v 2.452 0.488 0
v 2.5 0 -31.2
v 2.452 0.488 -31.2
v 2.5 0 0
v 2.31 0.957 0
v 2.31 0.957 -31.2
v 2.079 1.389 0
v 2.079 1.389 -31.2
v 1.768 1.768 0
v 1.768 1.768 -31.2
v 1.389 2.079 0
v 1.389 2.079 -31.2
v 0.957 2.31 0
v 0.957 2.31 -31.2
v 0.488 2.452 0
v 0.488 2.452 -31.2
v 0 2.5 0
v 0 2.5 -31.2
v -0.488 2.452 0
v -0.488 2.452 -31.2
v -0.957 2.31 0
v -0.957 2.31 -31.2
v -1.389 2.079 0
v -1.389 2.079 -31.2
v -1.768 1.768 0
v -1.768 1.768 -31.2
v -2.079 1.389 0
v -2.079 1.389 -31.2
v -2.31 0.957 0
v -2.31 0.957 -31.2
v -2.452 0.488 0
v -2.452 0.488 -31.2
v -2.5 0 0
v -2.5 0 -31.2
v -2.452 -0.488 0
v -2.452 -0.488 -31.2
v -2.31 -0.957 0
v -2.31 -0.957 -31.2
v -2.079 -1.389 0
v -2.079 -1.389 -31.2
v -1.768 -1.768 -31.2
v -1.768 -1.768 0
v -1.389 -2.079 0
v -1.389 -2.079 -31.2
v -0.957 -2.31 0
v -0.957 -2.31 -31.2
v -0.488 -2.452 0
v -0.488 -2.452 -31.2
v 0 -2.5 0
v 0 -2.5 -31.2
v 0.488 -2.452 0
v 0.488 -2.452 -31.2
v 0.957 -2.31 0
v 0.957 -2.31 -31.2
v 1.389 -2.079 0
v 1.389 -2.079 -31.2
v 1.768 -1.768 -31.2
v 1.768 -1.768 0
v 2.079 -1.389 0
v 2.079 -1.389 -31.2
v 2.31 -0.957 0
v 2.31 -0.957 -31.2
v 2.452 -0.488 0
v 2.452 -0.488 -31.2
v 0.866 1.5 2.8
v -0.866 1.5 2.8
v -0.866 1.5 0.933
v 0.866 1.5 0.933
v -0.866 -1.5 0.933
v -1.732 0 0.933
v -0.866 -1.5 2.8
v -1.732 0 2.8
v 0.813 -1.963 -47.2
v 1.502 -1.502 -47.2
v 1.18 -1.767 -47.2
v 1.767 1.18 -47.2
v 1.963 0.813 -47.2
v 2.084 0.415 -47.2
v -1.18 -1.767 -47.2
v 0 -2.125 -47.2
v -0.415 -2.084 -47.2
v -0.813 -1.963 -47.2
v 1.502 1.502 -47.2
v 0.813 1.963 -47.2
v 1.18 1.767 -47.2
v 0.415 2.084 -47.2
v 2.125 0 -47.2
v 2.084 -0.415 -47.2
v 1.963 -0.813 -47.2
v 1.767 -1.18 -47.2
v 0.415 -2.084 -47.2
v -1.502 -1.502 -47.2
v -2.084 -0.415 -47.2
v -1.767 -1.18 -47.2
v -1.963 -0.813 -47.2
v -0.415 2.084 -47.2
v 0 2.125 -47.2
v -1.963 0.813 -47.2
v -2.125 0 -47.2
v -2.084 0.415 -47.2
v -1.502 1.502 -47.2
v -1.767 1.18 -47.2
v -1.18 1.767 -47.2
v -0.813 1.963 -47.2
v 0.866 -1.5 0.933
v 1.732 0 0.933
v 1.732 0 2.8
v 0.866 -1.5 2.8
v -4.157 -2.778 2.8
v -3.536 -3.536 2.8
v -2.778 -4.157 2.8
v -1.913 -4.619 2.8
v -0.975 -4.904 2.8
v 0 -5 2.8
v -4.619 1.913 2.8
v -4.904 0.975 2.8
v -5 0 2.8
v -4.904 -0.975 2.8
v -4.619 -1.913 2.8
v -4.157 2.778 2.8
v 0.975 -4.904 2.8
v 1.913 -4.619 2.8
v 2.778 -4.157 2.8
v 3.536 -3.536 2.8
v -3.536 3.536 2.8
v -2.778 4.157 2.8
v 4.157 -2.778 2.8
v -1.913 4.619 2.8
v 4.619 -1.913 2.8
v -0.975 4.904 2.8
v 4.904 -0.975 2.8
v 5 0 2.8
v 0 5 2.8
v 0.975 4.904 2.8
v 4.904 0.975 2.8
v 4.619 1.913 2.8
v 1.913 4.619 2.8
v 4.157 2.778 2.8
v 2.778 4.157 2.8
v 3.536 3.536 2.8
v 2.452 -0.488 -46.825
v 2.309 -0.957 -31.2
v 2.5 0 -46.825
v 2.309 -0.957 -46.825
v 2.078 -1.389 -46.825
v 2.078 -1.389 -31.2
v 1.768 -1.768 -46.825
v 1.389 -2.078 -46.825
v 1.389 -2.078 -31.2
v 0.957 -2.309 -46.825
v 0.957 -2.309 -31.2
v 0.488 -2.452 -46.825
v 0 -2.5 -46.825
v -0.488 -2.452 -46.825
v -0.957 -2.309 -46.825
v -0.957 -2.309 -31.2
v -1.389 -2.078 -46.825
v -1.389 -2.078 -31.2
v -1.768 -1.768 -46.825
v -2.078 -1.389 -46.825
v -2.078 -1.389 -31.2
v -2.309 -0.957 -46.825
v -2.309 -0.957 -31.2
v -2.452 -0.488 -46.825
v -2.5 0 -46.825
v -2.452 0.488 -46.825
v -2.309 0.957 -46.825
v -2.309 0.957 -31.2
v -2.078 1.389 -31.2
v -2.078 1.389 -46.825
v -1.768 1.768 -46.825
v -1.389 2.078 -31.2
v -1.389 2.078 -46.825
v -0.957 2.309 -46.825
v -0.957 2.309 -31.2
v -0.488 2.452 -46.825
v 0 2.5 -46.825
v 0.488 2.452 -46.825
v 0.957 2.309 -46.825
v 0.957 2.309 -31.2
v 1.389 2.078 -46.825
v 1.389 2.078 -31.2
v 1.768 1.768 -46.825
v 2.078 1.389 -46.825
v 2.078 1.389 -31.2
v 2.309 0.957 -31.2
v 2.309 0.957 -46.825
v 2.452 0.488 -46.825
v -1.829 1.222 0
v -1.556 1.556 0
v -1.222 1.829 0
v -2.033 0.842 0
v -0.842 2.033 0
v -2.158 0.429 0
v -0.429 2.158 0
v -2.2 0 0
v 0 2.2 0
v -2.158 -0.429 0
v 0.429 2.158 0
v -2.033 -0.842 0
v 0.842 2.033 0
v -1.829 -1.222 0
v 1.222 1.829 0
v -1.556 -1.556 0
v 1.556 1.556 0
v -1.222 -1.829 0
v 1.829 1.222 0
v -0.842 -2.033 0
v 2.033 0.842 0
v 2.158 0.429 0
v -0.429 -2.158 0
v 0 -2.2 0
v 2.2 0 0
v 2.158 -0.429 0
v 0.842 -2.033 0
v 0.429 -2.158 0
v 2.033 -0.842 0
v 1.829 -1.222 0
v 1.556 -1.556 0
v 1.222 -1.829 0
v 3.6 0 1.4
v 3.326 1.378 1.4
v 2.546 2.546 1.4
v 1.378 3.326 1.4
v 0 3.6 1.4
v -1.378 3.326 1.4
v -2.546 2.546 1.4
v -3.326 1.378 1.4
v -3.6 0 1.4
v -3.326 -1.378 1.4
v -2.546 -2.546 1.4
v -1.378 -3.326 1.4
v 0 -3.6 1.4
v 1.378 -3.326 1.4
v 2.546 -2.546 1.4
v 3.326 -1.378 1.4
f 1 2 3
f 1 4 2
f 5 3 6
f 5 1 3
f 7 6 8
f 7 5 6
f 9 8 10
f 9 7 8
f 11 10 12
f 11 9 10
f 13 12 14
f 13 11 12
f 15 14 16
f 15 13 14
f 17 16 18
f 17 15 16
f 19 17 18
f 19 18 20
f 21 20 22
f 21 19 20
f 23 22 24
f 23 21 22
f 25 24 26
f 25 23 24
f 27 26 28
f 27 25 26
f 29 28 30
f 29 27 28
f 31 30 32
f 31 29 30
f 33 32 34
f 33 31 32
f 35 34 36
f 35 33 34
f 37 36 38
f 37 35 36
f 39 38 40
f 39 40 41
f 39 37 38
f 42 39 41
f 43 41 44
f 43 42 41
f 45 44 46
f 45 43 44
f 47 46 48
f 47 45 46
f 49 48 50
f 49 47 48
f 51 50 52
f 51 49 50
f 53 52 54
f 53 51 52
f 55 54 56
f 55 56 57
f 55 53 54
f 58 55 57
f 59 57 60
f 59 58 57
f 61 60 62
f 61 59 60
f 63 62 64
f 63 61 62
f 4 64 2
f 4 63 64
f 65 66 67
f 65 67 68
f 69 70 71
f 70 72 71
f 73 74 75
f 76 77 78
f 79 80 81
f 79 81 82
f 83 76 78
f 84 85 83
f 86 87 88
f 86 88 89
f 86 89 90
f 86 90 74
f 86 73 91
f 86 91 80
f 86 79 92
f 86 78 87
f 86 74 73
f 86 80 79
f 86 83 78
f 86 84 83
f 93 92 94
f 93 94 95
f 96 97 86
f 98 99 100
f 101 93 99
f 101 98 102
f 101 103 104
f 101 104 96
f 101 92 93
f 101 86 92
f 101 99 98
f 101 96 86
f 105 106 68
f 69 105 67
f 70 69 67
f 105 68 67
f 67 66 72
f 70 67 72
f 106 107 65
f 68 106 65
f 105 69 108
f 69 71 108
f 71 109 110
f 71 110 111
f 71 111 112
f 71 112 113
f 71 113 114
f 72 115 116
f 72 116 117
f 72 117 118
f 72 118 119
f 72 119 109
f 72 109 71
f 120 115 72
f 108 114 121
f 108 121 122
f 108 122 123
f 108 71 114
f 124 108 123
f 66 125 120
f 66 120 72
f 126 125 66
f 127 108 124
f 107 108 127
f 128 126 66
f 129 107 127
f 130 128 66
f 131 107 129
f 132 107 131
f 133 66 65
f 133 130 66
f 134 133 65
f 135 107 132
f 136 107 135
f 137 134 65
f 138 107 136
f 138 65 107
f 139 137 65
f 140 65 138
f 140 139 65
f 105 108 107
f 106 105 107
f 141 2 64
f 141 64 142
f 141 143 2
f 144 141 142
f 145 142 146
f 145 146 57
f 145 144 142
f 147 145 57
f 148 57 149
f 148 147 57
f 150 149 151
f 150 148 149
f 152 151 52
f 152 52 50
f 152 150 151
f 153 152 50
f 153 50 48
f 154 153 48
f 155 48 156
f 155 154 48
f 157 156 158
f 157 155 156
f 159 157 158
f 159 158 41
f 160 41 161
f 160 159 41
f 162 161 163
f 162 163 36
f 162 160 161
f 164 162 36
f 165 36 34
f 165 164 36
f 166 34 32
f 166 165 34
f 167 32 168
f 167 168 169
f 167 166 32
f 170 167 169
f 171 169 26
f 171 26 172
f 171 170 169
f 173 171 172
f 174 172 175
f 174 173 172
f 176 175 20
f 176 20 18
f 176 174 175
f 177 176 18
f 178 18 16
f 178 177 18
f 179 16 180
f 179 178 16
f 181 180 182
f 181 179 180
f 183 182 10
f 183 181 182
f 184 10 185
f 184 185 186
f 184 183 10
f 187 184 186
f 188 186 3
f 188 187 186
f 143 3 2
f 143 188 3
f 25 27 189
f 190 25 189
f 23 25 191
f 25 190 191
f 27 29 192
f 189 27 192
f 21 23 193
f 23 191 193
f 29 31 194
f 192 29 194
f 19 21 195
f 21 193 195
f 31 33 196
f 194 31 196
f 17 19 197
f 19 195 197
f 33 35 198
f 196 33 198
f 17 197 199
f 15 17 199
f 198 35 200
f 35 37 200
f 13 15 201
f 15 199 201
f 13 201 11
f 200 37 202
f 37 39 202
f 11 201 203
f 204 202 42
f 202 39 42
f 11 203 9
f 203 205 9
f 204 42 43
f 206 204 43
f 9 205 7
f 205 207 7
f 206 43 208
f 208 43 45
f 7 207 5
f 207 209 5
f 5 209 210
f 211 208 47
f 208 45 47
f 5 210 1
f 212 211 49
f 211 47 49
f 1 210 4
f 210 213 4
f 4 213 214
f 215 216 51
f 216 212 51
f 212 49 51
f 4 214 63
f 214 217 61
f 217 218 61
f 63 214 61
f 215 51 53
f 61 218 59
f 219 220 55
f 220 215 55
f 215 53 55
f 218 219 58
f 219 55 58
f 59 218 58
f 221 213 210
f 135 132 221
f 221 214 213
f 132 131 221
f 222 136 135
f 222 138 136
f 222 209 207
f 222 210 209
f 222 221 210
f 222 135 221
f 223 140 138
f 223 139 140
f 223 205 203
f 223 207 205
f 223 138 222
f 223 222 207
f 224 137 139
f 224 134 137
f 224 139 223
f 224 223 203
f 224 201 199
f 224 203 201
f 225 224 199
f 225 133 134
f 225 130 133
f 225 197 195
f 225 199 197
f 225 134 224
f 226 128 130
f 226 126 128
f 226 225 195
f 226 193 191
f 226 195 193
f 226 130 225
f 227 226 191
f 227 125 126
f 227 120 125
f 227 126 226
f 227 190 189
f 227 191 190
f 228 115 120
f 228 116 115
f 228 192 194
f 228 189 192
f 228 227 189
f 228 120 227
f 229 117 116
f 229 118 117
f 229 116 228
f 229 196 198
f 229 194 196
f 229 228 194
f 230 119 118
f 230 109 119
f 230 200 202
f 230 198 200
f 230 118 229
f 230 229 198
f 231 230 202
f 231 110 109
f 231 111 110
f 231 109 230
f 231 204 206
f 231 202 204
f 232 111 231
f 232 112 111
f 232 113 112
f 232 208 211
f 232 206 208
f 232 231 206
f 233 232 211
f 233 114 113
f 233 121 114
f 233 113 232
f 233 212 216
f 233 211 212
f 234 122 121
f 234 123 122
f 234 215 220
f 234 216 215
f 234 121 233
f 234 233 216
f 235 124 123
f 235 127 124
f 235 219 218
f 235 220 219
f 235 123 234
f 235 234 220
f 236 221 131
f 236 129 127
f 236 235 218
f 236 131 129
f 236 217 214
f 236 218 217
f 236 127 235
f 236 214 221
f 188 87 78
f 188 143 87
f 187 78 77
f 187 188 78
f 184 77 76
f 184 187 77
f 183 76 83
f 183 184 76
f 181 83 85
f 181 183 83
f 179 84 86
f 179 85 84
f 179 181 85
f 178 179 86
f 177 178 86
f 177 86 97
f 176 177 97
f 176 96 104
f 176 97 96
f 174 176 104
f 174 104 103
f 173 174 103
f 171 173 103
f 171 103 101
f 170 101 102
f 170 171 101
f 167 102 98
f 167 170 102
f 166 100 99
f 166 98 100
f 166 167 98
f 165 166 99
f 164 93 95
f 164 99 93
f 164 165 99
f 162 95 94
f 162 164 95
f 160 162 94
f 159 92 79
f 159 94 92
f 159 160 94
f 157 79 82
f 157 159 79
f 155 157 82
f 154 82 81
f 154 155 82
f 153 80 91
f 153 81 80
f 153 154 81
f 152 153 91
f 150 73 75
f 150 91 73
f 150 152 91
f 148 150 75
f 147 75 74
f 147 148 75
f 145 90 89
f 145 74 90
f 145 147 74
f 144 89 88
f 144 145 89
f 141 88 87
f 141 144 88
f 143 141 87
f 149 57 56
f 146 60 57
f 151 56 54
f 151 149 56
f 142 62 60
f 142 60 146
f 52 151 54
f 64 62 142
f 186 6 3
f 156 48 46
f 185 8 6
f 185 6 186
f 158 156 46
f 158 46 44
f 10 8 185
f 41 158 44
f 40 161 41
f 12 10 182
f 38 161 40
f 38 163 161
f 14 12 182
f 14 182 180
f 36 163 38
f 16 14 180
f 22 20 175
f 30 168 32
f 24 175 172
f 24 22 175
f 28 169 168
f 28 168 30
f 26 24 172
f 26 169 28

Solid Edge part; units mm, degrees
sketch "Sketch1" plane through (0, 0, 0) normal (0, 0, 1) x (1, 0, 0)
  circle A0 centre (0, 0) radius 5
  dimension "D1" = 10
extrude "Protrusion1" add sketch "Sketch1" along normal blind 2.8
sketch "Sketch2" plane through (0, 0, 0) normal (0, 0, -1) x (1, 0, 0)
  circle A0 centre (0, 0) radius 2.5
extrude "Protrusion2" add sketch "Sketch2" along normal blind 47.2
sketch "Sketch3" plane through (0, 0, -47.2) normal (0, 0, -1) x (1, 0, 0)
  circle A0 centre (0, 0) radius 2.4997
extrude "Cutout1" cut sketch "Sketch3" against normal blind 16 flip side to cut
chamfer "Chamfer_1" distance 0.375 angle 45 1 edges at (-2.4997, 0, -47.2)
sketch "Sketch4" plane through (0, 0, 2.8) normal (0, 0, 1) x (1, 0, 0)
  line L0 (-0.866, 1.5) -> (0.866, 1.5)
  line L1 (1.7321, 0) -> (0.866, 1.5)
  line L2 (0.866, -1.5) -> (1.7321, 0)
  line L3 (-0.866, -1.5) -> (0.866, -1.5)
  line L4 (-1.7321, 0) -> (-0.866, -1.5)
  line L5 (-0.866, 1.5) -> (-1.7321, 0)
  dimension "D1" = 3
extrude "Cutout2" cut sketch "Sketch4" against normal blind 1.8667
sketch "Sketch5" plane through (0, 0, 0) normal (0, -1, 0) x (1, 0, 0)
  line L0 (5, 2.8) -> (2.2, 0)
  line L1 (2.2, 0) -> (5, 0)
  line L2 (5, 0) -> (5, 2.8)
revolve "RevolvedCutout1" cut sketch "Sketch5" angle 360 about axis through (0, 0, 14.0017) along (0, 0, -1)
properties part number "24100000"
